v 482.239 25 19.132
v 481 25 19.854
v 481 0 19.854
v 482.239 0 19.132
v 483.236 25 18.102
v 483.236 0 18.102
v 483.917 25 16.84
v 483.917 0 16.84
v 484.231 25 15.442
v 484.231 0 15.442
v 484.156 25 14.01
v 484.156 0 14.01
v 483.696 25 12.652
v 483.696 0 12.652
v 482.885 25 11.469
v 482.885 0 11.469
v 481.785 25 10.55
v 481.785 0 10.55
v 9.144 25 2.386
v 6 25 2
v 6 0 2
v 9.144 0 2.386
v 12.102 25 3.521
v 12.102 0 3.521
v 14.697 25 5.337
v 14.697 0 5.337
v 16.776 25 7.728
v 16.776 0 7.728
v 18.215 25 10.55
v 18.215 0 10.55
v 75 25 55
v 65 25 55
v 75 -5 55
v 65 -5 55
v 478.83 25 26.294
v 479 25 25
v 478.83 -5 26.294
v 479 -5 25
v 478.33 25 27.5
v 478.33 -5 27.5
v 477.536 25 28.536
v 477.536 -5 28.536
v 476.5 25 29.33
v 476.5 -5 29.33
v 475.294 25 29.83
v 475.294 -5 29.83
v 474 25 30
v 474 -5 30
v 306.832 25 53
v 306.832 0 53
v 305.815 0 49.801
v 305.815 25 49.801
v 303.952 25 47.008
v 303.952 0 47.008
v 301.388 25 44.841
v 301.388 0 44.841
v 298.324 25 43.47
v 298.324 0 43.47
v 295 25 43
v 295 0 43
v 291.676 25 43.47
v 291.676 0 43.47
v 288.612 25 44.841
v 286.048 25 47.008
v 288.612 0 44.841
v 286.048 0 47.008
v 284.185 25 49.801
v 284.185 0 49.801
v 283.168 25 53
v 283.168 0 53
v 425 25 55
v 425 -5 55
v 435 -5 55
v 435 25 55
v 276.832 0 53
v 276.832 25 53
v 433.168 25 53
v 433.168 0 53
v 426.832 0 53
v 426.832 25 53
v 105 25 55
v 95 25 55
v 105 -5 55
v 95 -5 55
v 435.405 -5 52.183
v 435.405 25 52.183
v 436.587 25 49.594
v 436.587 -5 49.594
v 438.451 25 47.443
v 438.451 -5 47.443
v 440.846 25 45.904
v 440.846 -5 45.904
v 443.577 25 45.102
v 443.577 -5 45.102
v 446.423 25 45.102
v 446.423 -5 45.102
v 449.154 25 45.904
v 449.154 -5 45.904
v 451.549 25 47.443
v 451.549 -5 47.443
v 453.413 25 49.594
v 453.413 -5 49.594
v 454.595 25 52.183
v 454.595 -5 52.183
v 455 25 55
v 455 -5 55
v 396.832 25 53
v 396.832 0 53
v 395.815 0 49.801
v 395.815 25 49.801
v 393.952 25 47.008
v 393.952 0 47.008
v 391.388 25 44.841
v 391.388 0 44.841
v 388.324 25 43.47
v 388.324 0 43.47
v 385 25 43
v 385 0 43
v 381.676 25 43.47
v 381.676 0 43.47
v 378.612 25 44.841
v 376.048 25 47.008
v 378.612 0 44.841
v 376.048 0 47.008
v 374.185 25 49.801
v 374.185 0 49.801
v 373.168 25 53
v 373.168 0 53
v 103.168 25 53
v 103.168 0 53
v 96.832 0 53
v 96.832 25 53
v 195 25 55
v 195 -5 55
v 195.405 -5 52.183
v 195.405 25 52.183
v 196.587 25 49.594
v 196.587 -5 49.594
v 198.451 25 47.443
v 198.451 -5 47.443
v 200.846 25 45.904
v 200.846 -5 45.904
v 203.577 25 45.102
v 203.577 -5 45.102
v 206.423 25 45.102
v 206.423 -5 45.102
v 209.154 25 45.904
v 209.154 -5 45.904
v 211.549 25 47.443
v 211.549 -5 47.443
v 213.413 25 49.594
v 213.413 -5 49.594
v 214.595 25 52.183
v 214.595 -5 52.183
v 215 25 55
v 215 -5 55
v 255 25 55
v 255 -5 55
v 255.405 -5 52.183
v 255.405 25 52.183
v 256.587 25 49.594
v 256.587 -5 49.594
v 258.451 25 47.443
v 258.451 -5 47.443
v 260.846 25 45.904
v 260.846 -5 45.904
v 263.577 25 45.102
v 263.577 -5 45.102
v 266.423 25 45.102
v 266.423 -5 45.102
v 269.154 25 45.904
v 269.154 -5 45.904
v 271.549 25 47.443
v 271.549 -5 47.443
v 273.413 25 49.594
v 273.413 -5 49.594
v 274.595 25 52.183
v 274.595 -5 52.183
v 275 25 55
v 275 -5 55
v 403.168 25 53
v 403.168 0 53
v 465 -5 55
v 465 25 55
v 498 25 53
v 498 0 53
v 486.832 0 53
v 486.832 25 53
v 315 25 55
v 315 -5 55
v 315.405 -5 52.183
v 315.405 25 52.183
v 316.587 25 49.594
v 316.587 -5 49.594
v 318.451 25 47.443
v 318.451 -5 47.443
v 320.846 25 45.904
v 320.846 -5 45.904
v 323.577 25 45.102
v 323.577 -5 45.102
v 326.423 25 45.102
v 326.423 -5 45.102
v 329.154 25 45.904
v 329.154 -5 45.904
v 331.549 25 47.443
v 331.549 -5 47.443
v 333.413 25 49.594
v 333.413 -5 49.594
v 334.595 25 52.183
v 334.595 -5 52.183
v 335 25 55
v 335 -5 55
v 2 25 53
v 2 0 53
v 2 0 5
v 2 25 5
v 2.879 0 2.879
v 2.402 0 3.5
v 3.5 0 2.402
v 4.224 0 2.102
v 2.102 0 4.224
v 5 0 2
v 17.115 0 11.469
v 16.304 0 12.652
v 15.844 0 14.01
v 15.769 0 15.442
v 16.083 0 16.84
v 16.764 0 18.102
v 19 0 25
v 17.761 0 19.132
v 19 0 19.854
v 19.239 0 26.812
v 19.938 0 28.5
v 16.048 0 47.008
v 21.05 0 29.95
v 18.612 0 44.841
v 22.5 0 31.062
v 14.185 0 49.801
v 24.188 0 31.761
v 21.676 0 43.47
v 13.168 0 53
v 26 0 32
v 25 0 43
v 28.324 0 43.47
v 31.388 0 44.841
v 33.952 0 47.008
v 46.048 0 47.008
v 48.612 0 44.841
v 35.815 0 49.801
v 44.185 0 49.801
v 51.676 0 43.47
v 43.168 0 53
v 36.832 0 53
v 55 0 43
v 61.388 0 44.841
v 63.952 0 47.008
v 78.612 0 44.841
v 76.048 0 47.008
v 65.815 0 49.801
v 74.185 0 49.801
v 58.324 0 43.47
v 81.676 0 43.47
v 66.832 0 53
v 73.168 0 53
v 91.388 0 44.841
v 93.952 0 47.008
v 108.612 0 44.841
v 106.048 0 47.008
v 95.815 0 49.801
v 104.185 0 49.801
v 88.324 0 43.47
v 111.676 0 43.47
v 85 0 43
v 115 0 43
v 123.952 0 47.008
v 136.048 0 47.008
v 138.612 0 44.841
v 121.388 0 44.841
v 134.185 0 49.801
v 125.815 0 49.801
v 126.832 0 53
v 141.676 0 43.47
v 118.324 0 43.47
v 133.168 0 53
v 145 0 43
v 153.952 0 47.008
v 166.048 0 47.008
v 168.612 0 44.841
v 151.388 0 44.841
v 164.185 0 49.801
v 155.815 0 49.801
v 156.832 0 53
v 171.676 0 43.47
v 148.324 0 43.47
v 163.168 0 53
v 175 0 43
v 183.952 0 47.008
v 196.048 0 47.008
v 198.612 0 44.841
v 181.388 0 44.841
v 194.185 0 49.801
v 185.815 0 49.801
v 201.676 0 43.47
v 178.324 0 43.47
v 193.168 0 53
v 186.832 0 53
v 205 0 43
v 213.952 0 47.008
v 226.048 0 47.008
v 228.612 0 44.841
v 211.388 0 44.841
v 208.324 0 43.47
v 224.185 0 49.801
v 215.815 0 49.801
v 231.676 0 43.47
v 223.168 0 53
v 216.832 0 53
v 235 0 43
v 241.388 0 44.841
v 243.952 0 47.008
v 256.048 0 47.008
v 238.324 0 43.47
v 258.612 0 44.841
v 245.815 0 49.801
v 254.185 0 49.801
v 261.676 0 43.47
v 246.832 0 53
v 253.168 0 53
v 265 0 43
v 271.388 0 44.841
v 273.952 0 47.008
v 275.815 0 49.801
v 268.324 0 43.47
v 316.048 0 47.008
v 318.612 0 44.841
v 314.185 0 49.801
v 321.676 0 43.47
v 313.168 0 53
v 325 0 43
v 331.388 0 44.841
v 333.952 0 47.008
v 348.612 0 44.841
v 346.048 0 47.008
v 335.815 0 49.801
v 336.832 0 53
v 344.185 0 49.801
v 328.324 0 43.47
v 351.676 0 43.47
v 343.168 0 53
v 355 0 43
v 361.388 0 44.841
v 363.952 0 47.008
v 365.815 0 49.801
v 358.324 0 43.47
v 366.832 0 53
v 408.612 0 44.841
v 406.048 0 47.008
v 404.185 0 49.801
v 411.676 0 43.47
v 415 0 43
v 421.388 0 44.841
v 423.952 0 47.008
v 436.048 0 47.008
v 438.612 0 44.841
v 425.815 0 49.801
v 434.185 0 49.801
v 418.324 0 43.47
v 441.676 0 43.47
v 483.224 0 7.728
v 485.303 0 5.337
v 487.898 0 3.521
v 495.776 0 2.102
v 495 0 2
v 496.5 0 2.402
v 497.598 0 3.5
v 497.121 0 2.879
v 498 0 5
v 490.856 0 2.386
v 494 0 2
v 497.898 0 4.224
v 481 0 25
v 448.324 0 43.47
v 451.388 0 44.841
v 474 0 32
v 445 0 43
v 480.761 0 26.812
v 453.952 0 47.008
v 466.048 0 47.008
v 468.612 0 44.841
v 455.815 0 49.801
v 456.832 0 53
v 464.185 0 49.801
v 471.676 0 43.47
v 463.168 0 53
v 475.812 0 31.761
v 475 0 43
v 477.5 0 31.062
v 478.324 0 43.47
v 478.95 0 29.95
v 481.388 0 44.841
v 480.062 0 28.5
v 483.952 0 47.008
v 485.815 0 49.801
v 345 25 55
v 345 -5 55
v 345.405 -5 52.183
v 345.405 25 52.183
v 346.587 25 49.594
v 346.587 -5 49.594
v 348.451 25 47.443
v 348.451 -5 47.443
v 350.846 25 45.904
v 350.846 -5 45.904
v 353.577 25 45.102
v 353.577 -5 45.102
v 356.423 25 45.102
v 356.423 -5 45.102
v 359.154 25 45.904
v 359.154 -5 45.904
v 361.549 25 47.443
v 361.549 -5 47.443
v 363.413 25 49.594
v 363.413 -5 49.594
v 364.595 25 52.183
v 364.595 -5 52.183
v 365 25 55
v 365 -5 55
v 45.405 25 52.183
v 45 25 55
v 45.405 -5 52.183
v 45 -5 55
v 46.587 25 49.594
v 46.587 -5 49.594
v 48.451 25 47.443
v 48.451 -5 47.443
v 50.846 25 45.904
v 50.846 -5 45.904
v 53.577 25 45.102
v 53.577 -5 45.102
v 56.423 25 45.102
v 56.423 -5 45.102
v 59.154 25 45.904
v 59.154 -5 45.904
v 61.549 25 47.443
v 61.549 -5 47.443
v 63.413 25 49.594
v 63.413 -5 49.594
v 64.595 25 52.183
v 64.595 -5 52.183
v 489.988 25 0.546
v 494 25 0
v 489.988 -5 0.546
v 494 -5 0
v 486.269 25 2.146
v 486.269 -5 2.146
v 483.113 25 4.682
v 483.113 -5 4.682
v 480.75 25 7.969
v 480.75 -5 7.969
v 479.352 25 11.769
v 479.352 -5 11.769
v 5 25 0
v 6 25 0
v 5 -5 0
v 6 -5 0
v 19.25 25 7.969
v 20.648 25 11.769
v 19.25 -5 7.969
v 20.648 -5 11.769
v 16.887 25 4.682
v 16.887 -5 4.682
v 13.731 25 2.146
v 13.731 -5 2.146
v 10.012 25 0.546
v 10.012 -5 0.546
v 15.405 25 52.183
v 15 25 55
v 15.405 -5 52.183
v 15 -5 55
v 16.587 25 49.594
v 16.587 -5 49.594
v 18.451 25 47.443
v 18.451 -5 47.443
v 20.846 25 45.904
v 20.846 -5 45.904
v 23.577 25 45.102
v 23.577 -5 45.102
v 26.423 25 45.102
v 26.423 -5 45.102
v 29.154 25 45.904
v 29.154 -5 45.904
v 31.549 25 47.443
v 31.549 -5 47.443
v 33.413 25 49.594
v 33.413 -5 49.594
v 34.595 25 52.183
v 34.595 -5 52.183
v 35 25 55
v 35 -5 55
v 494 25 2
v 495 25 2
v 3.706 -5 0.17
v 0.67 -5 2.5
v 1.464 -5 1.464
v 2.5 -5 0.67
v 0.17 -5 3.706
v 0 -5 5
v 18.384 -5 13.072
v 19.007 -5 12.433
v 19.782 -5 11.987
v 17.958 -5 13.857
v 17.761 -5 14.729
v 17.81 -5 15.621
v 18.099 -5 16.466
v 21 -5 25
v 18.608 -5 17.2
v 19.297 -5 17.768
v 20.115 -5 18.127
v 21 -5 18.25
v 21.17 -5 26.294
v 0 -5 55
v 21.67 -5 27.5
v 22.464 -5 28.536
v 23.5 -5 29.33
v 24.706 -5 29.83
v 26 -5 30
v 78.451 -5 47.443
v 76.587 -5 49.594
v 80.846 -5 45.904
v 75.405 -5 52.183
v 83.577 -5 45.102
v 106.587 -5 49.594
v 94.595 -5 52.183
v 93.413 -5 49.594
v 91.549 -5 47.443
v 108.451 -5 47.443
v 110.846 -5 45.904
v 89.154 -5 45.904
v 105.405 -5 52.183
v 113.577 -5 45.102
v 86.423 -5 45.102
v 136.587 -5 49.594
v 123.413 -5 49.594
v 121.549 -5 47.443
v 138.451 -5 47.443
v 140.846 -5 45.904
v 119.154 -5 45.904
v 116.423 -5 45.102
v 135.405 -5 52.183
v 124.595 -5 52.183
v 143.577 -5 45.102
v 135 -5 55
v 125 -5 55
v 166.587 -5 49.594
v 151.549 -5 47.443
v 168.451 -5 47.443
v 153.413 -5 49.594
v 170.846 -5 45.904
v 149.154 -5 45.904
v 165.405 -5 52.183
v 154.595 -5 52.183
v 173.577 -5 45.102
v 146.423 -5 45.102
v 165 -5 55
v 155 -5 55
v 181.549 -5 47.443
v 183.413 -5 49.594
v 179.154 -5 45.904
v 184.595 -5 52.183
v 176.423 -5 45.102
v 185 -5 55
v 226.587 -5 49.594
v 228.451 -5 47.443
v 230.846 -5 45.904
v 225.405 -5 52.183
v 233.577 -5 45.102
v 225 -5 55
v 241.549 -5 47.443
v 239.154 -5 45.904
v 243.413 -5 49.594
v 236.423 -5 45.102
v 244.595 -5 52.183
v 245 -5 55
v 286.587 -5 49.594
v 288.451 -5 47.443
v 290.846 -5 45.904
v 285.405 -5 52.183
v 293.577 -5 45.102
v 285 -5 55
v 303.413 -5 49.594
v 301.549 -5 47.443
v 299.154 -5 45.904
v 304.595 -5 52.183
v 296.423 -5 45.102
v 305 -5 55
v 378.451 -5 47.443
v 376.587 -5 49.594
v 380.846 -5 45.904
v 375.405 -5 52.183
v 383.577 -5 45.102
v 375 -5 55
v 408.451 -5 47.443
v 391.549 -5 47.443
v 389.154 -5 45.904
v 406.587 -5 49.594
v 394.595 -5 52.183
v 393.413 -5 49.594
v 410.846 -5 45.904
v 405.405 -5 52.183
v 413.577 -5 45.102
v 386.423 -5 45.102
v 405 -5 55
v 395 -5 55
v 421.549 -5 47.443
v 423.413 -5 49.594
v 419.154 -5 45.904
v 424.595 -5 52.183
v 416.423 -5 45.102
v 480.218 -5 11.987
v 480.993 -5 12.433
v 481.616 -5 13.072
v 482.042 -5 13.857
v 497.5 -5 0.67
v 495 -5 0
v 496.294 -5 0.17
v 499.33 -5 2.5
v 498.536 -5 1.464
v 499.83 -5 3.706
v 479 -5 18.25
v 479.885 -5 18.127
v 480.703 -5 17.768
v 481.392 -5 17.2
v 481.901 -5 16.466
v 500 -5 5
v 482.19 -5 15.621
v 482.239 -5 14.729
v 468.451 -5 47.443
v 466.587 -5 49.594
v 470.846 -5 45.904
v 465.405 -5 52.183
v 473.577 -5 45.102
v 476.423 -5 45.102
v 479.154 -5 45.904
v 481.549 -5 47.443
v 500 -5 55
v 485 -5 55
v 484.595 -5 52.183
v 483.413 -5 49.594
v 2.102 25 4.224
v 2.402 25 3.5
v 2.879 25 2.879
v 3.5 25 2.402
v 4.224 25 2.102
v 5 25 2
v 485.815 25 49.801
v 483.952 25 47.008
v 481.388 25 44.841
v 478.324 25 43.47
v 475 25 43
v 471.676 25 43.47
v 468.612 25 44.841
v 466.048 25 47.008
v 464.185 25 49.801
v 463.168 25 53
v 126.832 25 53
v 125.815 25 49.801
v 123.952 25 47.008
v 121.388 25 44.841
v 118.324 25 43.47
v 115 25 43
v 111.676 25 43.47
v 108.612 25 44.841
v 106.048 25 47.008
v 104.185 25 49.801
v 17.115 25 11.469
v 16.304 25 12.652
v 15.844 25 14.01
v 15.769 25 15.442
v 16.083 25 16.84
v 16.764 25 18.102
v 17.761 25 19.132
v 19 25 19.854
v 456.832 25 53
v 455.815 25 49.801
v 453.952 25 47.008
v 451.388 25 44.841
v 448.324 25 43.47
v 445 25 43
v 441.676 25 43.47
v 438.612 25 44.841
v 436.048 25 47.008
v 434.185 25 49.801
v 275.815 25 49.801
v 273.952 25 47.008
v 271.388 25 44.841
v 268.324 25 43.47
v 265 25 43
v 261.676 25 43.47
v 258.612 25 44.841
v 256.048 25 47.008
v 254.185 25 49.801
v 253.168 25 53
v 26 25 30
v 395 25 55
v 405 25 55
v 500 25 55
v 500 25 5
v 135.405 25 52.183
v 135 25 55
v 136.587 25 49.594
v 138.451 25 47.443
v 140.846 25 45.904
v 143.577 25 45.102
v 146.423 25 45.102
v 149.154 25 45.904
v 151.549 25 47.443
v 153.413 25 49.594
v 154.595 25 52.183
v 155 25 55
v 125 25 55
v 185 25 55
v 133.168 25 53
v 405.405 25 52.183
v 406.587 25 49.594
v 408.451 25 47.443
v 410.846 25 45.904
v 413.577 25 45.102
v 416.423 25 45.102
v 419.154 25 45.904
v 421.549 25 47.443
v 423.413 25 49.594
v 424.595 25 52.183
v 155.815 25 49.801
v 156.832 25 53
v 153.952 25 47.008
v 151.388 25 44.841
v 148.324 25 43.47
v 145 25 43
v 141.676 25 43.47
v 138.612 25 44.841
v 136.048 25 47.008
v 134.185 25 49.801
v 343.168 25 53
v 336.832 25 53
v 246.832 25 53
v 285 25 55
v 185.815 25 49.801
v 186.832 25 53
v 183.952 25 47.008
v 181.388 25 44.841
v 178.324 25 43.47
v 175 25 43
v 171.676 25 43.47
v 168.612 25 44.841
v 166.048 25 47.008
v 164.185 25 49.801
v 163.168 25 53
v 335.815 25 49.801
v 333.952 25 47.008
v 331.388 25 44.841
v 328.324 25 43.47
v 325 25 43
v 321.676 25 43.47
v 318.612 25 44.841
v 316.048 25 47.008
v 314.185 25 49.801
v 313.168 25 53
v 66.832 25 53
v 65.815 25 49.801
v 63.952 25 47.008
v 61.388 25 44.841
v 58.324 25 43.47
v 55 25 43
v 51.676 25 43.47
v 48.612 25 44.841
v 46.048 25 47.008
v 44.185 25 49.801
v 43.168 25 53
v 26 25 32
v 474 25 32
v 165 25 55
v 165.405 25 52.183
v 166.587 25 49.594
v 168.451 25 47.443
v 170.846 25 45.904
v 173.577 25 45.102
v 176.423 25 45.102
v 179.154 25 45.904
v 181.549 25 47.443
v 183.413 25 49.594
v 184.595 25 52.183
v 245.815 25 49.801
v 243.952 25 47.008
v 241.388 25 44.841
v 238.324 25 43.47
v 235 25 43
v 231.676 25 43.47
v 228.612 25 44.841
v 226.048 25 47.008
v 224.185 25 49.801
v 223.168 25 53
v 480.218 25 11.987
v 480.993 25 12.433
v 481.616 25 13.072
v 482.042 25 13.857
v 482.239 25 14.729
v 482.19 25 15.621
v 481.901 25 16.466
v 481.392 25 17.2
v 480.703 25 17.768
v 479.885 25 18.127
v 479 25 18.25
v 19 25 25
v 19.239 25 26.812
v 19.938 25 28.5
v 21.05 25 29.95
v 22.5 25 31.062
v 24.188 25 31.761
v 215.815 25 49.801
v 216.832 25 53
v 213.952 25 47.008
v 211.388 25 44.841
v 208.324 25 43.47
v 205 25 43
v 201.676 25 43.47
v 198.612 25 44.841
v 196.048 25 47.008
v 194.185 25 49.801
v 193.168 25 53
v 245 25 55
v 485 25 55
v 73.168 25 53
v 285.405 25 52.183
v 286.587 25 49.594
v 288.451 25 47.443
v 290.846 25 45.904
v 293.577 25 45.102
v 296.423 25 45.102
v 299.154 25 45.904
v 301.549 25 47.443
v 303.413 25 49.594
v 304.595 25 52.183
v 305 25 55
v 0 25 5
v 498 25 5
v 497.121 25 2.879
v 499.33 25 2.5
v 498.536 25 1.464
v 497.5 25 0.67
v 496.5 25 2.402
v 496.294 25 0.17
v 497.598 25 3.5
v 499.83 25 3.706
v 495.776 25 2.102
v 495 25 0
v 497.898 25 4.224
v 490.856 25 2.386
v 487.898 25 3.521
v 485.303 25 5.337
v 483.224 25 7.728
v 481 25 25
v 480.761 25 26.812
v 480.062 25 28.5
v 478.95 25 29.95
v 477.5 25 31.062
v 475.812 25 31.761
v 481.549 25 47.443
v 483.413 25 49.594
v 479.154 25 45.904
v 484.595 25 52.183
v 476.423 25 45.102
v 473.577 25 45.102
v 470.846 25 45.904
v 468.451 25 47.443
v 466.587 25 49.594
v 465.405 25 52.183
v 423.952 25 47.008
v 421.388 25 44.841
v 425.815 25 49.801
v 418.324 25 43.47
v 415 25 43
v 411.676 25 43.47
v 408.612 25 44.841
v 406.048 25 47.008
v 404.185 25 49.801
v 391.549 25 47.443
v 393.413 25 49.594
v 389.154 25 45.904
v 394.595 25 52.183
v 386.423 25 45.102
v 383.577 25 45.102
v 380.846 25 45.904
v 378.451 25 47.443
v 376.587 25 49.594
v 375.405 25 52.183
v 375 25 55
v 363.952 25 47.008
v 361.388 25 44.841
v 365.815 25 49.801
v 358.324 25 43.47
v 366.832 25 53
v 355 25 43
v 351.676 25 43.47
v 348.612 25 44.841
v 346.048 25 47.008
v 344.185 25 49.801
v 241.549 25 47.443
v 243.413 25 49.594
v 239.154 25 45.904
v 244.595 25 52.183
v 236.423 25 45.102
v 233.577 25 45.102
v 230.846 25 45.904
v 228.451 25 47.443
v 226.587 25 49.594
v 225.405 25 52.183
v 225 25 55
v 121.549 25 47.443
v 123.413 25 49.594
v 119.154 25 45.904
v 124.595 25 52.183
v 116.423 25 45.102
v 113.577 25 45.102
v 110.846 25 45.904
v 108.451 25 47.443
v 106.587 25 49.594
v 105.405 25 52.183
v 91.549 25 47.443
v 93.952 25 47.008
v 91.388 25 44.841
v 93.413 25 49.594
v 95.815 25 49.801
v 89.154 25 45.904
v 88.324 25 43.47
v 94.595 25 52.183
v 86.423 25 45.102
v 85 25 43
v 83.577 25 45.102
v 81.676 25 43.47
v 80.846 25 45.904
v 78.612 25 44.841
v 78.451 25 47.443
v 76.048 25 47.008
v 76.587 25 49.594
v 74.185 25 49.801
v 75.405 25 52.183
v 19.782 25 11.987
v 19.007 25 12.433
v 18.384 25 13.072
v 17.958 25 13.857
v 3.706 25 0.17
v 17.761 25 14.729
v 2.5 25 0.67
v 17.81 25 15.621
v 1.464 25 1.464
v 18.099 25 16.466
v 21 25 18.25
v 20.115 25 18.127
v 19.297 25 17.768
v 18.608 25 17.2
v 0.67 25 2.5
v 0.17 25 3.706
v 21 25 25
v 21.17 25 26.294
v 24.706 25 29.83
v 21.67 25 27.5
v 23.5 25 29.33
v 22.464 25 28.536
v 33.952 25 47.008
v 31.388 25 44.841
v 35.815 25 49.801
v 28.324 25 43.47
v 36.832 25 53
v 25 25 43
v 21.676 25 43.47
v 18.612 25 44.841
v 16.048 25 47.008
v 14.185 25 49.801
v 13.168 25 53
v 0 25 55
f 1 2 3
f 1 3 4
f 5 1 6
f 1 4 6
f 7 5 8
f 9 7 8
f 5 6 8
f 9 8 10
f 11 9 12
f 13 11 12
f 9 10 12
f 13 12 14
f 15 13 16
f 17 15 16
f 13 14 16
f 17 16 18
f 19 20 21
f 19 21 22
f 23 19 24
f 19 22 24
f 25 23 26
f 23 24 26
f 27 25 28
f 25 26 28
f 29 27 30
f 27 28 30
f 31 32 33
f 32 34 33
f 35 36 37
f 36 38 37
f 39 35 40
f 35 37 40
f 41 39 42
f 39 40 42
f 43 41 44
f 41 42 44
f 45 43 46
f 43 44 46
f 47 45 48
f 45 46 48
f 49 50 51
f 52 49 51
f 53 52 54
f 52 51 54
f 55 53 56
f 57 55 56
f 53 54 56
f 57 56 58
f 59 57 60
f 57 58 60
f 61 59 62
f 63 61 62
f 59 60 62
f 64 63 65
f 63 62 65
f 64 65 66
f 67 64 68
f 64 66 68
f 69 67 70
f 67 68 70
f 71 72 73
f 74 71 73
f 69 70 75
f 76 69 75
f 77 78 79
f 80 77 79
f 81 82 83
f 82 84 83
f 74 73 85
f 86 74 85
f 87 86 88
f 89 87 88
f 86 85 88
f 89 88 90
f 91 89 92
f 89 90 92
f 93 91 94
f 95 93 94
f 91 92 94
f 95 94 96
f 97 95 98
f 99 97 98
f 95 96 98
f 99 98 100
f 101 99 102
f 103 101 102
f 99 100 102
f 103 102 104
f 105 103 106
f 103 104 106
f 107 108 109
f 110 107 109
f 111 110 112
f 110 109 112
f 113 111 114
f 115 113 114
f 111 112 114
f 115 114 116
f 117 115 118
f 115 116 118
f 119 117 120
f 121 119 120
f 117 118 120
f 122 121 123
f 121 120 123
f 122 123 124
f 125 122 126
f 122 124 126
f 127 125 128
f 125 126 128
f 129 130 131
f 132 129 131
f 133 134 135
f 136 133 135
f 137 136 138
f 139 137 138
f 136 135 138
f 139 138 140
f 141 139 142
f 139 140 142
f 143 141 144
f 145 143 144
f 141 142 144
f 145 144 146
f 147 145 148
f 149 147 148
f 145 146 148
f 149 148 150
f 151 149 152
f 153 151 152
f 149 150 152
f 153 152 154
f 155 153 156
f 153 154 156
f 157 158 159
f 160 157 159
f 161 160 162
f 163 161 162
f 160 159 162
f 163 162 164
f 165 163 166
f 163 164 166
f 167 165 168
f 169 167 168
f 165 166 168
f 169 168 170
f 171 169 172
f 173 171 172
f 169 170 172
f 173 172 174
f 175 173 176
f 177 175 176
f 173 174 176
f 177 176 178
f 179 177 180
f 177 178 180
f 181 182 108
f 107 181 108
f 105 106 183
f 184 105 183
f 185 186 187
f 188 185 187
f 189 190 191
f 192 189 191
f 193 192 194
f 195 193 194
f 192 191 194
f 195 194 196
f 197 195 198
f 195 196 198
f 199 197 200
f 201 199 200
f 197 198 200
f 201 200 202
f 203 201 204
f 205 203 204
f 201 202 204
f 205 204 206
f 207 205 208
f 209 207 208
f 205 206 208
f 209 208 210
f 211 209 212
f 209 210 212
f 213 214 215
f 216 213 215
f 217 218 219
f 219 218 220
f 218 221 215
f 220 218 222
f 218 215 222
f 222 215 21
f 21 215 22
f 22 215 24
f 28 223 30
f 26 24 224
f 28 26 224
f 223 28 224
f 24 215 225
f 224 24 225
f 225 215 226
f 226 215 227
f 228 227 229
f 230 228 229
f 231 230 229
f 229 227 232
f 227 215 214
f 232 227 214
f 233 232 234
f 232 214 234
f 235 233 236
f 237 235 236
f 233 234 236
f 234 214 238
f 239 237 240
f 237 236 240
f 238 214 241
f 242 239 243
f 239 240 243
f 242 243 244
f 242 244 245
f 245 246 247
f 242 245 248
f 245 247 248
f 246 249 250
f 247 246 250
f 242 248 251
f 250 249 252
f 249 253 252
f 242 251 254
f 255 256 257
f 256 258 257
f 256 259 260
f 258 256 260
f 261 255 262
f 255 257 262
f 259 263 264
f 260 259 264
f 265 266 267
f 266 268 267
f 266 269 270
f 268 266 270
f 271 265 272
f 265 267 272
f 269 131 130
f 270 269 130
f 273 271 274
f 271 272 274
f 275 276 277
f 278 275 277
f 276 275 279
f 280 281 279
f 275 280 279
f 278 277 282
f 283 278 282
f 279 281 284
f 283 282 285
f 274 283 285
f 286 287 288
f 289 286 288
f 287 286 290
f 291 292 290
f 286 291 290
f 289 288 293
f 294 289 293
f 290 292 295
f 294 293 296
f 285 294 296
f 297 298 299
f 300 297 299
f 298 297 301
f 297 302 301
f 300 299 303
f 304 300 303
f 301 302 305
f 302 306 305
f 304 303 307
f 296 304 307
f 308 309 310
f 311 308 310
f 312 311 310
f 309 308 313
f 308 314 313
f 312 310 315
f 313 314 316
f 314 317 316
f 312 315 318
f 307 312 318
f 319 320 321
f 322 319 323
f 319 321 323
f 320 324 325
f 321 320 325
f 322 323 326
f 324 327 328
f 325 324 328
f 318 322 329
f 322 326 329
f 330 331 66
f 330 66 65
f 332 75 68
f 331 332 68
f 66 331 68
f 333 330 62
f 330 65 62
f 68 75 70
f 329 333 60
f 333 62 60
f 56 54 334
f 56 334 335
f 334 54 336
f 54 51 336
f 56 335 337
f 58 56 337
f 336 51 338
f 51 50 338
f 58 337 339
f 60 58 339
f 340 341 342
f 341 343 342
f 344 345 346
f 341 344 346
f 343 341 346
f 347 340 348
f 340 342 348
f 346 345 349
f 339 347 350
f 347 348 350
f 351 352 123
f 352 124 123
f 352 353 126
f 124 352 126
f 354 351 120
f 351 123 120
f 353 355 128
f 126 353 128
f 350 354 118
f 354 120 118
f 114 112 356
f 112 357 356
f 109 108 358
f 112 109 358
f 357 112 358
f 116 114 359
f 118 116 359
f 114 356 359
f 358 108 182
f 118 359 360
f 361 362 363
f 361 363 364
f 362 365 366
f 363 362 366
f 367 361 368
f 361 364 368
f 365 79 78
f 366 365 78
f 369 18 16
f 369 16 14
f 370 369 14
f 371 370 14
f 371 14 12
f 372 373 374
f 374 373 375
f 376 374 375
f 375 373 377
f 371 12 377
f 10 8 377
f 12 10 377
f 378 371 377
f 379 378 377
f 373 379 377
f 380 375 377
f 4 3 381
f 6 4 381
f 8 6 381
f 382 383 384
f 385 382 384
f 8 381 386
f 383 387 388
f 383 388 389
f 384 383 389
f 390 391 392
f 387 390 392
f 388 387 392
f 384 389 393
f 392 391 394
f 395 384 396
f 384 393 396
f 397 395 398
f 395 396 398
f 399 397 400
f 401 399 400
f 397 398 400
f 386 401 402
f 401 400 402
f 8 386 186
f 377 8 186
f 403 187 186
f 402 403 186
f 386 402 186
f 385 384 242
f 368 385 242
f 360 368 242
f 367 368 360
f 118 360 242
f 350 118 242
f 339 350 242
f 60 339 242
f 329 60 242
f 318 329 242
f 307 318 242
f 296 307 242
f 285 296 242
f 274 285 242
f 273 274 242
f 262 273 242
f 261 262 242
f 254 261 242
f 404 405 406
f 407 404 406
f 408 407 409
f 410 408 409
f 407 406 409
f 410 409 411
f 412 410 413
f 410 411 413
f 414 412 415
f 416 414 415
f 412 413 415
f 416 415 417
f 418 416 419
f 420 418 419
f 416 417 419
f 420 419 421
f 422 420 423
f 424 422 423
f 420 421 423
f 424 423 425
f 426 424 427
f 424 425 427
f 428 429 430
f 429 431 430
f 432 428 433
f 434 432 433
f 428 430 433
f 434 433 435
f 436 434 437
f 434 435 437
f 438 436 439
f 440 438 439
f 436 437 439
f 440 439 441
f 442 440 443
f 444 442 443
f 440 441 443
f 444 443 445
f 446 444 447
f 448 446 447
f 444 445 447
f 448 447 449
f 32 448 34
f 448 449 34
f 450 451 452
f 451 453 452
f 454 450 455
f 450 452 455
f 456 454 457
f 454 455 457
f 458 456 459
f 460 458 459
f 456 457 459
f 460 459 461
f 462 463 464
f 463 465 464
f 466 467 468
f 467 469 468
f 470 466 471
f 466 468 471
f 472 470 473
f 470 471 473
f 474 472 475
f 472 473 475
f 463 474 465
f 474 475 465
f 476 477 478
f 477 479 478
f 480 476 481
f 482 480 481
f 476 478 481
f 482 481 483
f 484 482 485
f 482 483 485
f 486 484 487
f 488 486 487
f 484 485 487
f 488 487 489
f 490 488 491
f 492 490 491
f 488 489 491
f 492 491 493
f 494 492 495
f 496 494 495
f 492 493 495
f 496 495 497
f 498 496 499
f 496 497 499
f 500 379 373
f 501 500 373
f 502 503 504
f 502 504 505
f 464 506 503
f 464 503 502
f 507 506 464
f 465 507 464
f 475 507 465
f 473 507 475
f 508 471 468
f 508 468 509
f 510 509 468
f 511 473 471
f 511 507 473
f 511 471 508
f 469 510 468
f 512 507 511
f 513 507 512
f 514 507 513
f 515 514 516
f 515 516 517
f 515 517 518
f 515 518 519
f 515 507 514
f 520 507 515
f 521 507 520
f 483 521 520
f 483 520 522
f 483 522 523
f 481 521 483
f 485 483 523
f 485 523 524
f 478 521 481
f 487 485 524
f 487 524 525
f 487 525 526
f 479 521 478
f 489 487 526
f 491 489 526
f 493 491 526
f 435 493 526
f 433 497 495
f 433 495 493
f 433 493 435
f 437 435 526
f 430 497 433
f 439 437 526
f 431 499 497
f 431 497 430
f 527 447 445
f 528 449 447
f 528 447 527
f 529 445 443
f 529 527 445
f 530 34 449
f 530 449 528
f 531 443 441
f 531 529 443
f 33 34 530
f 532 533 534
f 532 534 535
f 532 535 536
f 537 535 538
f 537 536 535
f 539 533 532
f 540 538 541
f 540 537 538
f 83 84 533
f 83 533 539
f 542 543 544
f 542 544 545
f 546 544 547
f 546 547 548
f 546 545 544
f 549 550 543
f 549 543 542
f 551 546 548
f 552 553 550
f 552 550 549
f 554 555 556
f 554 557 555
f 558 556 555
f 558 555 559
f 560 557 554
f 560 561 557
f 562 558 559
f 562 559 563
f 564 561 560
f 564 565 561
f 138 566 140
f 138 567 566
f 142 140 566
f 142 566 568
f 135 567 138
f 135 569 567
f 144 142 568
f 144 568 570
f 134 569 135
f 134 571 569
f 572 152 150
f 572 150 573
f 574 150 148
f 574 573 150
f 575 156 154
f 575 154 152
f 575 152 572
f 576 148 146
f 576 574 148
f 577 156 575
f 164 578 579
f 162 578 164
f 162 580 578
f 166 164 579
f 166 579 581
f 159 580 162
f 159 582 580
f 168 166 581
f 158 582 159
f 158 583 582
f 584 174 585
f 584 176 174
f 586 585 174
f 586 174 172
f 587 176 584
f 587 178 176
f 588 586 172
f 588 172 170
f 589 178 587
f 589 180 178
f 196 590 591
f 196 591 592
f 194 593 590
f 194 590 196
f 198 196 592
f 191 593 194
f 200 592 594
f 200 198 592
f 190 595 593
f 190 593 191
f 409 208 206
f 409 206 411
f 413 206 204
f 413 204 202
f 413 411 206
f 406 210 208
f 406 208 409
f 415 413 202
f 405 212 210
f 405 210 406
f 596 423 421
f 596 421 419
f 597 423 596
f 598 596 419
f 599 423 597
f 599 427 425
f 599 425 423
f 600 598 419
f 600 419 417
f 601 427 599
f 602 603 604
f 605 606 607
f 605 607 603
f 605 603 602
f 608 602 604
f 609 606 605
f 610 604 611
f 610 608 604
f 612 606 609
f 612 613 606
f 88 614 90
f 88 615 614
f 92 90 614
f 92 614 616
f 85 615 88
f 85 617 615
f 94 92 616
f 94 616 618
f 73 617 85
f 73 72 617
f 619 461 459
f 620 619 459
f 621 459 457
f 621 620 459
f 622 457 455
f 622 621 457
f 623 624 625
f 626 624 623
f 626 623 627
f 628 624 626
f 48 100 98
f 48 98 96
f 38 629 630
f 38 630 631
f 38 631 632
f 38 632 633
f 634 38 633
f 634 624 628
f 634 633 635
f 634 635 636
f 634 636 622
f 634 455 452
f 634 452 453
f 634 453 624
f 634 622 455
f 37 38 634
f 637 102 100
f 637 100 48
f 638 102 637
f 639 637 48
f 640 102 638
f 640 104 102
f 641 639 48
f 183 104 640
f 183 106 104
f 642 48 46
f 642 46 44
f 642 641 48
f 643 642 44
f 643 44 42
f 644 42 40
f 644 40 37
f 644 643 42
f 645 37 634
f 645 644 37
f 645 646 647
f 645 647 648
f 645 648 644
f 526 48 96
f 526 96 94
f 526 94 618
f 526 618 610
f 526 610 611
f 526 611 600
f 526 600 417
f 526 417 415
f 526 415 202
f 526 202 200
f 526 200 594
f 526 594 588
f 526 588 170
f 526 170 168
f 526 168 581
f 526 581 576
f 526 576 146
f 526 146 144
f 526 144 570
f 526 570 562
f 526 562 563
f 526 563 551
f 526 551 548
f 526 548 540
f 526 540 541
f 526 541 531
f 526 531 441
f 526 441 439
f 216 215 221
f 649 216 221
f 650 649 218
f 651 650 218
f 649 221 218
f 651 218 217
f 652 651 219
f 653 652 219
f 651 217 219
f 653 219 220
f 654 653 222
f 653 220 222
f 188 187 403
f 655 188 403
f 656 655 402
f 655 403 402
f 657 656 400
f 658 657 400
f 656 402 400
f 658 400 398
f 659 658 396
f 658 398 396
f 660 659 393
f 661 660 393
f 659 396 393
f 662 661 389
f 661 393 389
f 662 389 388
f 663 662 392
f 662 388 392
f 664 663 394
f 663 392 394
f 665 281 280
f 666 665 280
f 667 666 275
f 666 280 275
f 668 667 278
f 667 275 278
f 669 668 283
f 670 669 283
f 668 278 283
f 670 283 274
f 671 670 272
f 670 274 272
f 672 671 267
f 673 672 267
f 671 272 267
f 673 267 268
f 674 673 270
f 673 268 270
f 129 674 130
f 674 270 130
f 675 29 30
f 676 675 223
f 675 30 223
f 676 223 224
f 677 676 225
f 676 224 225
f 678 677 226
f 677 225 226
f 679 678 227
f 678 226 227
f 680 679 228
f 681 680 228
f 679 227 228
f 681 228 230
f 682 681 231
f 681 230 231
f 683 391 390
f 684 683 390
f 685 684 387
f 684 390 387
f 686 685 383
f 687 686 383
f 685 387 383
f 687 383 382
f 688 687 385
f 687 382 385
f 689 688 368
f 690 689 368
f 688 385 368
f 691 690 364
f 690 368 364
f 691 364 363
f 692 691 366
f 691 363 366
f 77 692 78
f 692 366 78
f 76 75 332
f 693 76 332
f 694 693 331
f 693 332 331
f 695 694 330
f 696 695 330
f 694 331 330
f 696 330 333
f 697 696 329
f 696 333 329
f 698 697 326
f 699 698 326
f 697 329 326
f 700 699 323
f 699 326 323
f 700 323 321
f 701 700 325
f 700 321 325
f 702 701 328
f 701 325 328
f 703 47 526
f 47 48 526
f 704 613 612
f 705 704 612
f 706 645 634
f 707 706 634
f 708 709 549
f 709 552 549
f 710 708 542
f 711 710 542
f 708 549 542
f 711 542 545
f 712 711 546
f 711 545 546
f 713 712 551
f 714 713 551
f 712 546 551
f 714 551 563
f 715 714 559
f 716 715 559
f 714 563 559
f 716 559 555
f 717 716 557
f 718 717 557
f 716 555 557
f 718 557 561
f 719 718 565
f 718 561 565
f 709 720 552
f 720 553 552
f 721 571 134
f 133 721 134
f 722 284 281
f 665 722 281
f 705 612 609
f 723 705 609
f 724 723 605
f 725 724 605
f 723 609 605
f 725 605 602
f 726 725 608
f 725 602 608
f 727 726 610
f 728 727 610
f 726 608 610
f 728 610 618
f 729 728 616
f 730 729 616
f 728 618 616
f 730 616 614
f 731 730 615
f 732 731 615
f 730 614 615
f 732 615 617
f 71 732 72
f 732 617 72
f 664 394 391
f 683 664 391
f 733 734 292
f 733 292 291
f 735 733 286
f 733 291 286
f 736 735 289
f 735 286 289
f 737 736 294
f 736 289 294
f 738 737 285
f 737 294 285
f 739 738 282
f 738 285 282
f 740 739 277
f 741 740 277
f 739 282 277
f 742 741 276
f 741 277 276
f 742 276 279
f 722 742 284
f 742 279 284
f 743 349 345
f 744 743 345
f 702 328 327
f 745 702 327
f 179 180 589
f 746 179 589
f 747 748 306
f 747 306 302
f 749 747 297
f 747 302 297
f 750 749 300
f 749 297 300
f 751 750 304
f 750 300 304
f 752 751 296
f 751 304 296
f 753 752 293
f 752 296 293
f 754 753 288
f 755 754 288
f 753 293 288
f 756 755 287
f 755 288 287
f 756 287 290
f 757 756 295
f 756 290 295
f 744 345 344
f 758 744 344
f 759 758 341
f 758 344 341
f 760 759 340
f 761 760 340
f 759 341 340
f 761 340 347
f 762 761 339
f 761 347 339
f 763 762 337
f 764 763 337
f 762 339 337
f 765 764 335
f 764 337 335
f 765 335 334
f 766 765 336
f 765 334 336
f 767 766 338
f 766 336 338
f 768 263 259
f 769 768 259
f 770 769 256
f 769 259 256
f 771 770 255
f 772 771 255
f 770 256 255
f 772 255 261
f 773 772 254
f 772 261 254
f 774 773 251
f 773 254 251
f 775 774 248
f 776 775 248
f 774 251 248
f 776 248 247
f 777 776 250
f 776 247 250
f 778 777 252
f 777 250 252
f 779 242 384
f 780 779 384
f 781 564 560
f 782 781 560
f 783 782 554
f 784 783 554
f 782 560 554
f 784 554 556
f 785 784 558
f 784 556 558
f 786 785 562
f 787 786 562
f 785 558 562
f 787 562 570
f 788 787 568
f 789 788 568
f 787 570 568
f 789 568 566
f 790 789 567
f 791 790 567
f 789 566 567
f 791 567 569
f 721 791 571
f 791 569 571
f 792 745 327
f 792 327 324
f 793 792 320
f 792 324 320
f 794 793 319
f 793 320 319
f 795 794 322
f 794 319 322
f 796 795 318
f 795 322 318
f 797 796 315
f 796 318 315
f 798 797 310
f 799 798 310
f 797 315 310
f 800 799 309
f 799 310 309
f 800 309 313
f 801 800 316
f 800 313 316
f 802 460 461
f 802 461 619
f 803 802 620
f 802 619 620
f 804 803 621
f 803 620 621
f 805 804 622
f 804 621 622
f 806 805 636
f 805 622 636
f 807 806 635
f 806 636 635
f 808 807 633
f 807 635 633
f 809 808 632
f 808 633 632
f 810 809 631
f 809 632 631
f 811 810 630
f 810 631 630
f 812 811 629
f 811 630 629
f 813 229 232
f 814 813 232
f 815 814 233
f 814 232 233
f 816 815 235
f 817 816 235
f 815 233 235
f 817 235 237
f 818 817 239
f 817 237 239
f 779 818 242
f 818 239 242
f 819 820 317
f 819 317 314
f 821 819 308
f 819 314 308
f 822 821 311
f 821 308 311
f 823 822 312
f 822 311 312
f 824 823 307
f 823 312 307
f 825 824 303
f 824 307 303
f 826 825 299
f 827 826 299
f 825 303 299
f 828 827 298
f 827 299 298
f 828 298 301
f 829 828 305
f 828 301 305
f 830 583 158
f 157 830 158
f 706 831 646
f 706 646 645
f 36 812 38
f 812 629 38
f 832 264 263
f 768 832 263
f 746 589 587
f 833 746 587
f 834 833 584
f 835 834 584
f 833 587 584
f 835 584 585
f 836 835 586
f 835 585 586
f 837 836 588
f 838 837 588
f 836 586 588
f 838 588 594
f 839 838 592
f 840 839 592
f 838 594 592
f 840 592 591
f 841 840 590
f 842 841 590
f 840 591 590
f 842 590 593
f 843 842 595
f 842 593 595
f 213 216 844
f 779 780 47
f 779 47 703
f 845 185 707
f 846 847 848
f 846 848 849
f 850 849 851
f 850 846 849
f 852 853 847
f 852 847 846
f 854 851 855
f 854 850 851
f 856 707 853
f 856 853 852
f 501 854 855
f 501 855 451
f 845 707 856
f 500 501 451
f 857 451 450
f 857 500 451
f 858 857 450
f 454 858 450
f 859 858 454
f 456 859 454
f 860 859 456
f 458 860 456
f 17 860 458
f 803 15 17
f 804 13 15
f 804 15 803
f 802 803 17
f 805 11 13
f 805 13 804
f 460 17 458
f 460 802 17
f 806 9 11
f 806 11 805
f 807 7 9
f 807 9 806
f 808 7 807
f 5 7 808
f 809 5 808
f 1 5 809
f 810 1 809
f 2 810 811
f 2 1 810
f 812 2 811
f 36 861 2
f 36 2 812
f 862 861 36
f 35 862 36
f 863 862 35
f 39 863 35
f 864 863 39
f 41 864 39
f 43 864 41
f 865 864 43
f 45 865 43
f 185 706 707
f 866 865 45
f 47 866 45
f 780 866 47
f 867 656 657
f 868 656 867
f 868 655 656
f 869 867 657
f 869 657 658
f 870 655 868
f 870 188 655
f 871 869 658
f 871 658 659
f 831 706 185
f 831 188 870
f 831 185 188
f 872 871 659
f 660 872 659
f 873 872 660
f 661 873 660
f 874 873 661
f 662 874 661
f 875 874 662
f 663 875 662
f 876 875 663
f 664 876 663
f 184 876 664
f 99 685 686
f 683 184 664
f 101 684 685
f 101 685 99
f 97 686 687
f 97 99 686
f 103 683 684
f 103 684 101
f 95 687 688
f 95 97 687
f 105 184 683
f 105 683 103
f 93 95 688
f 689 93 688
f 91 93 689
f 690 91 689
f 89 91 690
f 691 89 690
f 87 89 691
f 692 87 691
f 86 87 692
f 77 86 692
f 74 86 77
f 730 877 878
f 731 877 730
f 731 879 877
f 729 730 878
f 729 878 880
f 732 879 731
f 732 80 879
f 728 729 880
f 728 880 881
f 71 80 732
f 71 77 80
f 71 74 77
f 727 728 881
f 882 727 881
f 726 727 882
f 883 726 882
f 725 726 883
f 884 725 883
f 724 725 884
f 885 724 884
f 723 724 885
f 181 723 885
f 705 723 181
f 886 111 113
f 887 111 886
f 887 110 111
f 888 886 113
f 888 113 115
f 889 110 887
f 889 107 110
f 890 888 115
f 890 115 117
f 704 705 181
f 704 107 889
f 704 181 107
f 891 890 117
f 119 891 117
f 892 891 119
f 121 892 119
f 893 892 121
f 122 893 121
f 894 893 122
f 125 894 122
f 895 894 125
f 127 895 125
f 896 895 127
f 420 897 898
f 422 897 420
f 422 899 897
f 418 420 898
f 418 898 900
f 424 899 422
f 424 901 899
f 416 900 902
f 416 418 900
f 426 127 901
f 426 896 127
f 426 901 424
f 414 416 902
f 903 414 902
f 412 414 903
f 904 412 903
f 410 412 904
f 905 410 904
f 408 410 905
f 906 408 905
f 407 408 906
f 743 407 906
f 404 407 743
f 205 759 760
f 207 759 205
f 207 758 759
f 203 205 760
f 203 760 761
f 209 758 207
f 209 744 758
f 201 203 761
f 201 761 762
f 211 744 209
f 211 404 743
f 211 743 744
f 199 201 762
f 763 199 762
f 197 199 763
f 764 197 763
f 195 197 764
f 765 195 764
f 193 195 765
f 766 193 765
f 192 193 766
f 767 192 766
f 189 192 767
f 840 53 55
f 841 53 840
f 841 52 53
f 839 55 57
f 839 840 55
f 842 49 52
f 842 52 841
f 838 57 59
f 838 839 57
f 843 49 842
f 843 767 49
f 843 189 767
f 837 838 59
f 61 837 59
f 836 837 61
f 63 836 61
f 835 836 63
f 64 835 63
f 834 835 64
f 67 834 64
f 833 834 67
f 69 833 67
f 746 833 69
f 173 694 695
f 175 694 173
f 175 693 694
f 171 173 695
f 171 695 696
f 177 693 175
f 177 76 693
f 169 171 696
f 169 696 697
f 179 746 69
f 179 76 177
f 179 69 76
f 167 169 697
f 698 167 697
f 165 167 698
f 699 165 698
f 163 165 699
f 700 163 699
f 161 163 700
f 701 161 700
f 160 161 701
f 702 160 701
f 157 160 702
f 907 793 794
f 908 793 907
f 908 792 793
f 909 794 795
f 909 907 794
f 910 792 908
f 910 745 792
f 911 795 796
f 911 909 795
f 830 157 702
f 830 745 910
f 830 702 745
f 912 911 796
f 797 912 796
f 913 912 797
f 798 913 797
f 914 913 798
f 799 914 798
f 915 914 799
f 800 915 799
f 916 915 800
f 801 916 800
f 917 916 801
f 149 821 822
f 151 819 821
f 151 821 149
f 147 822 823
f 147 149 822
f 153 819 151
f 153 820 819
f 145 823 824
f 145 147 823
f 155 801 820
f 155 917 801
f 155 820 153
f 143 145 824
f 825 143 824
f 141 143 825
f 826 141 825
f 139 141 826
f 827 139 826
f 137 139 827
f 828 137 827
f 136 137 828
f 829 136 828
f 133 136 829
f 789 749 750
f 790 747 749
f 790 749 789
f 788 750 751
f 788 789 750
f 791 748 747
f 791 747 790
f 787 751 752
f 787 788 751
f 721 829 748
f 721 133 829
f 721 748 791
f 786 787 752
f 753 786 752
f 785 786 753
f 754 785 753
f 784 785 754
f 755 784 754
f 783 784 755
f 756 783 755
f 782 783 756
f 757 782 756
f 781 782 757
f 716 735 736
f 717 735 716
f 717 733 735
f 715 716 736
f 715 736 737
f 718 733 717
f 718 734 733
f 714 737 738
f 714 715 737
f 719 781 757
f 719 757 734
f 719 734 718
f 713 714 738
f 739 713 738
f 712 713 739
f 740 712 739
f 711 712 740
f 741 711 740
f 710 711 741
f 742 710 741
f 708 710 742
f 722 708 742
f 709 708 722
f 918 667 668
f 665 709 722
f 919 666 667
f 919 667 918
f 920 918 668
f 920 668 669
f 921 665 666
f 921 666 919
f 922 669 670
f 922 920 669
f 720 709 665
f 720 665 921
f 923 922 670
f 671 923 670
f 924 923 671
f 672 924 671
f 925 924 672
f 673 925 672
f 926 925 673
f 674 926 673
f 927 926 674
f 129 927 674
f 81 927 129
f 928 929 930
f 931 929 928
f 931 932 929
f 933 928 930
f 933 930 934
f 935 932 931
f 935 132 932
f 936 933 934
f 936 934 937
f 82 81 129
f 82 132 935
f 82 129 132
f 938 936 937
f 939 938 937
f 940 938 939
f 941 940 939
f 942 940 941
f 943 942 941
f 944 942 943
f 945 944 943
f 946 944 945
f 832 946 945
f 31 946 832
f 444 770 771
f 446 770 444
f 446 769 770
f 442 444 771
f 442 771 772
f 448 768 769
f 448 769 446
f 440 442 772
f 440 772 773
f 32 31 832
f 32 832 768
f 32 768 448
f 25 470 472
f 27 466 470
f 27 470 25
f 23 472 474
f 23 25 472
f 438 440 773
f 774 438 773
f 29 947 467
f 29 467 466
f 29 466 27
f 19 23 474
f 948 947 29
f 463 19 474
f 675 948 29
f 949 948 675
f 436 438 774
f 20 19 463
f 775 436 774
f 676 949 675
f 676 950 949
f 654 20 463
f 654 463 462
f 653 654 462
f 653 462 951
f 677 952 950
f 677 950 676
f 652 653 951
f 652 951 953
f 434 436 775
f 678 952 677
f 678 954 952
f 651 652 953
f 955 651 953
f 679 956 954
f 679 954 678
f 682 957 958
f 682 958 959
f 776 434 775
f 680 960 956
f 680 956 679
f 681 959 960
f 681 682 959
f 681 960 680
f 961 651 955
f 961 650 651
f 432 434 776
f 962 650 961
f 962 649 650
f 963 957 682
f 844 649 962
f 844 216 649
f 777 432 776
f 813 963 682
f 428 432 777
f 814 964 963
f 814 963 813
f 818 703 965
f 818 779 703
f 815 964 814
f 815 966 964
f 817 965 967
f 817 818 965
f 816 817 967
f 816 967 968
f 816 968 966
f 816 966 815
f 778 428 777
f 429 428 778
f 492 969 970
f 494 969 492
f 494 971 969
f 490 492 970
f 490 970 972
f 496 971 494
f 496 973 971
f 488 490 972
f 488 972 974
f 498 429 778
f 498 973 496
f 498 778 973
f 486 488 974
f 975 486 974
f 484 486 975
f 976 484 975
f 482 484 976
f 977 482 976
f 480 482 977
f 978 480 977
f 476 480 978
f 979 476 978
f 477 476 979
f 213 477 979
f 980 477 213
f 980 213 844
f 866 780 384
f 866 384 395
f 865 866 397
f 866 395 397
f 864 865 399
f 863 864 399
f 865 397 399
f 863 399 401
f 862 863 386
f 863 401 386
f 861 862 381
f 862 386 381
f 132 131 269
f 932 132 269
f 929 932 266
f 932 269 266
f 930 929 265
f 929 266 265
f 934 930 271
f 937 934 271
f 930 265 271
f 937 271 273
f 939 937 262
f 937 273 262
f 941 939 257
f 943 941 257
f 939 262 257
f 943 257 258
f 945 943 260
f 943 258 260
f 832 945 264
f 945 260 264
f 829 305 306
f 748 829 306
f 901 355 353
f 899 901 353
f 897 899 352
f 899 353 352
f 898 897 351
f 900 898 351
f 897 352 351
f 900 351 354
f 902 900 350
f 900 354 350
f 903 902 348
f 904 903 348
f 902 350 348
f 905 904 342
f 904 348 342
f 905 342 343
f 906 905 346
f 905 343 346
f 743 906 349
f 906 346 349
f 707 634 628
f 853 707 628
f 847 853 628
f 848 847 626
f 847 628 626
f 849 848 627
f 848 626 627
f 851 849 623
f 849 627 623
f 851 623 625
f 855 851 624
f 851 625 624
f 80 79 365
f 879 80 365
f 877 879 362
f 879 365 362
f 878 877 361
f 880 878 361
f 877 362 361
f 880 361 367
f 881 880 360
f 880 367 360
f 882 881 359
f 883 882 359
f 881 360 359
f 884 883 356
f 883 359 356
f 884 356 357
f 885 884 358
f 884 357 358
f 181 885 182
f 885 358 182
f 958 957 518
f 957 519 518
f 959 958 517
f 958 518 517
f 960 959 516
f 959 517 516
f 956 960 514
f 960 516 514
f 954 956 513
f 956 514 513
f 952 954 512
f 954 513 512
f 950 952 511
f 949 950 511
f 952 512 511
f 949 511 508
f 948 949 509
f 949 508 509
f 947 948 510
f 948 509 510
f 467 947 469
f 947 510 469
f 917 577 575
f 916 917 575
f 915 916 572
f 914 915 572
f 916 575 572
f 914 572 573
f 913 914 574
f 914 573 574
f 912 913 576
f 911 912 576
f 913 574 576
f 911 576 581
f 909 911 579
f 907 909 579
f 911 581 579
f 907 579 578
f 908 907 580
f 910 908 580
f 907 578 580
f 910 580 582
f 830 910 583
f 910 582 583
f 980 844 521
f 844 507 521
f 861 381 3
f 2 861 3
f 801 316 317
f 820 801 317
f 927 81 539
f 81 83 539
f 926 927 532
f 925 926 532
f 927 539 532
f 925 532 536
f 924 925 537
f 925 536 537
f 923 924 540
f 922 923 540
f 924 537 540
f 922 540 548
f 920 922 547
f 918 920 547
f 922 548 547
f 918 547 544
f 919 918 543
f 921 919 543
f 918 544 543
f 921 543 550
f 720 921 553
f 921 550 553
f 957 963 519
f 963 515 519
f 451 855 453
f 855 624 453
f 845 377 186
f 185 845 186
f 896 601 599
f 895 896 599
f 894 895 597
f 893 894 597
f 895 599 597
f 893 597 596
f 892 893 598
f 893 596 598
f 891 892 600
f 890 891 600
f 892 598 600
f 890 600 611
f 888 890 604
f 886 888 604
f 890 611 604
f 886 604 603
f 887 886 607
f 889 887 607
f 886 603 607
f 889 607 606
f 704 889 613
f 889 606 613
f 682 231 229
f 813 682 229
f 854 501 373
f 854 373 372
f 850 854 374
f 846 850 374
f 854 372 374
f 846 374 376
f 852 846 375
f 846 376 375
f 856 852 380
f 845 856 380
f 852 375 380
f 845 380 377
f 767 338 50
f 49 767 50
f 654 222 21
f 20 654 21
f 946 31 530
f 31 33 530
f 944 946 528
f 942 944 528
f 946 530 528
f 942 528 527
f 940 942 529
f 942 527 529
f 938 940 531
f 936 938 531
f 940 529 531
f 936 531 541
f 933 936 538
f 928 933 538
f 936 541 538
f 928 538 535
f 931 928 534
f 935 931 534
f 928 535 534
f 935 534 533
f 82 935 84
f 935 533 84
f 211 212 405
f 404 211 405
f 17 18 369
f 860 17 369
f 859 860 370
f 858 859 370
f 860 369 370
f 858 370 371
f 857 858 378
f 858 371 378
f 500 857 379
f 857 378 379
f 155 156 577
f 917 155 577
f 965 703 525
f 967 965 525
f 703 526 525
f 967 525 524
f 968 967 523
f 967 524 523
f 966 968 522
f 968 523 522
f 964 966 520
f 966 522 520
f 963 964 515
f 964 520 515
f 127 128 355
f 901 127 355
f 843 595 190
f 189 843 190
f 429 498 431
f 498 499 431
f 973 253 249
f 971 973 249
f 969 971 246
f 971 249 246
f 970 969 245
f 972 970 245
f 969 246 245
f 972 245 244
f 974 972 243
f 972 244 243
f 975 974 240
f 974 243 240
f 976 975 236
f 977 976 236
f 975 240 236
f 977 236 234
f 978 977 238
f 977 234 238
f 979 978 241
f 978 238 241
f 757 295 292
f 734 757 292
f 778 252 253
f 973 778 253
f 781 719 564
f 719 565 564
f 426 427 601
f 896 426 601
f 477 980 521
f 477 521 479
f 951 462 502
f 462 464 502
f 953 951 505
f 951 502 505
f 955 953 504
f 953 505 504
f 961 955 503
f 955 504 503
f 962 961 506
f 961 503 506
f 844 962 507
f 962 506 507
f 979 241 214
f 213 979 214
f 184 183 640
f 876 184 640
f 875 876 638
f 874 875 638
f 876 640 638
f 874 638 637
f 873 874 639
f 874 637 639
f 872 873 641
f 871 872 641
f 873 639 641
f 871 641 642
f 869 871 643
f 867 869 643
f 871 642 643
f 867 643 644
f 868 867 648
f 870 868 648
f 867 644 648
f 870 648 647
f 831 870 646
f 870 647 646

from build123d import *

# Parameters (mm, degrees)
F1_DEPTH = 5
F3_DEPTH = 25


with BuildPart() as f1:
    # F0 (on Front) → F1 (new body)
    with BuildSketch(Plane.XZ):
        with BuildLine():
            ThreePointArc((0, 5), (1.464466, 1.464466), (5, 0))
            Line((5, 0), (6, 0))
            ThreePointArc((6, 0), (15.395129, 3.306774), (20.647917, 11.769127))
            ThreePointArc((20.647917, 11.769127), (17.754785, 15.176301), (21, 18.25))
            Line((21, 18.25), (21, 25))
            ThreePointArc((21, 25), (22.464466, 28.535534), (26, 30))
            Line((26, 30), (474, 30))
            ThreePointArc((474, 30), (477.535534, 28.535534), (479, 25))
            Line((479, 25), (479, 18.25))
            ThreePointArc((479, 18.25), (482.245215, 15.176301), (479.352083, 11.769127))
            ThreePointArc((479.352083, 11.769127), (484.604871, 3.306774), (494, 0))
            Line((494, 0), (495, 0))
            ThreePointArc((495, 0), (498.535534, 1.464466), (500, 5))
            Line((500, 5), (500, 55))
            Line((500, 55), (485, 55))
            ThreePointArc((485, 55), (475, 45), (465, 55))
            Line((465, 55), (455, 55))
            ThreePointArc((455, 55), (445, 45), (435, 55))
            Line((435, 55), (425, 55))
            ThreePointArc((425, 55), (415, 45), (405, 55))
            Line((405, 55), (395, 55))
            ThreePointArc((395, 55), (385, 45), (375, 55))
            Line((375, 55), (365, 55))
            ThreePointArc((365, 55), (355, 45), (345, 55))
            Line((345, 55), (335, 55))
            ThreePointArc((335, 55), (325, 45), (315, 55))
            Line((315, 55), (305, 55))
            ThreePointArc((305, 55), (295, 45), (285, 55))
            Line((285, 55), (275, 55))
            ThreePointArc((275, 55), (265, 45), (255, 55))
            Line((255, 55), (245, 55))
            ThreePointArc((245, 55), (235, 45), (225, 55))
            Line((225, 55), (215, 55))
            ThreePointArc((215, 55), (205, 45), (195, 55))
            Line((195, 55), (185, 55))
            ThreePointArc((185, 55), (175, 45), (165, 55))
            Line((165, 55), (155, 55))
            ThreePointArc((155, 55), (145, 45), (135, 55))
            Line((135, 55), (125, 55))
            ThreePointArc((125, 55), (115, 45), (105, 55))
            Line((105, 55), (95, 55))
            ThreePointArc((95, 55), (85, 45), (75, 55))
            Line((75, 55), (65, 55))
            ThreePointArc((65, 55), (55, 45), (45, 55))
            Line((45, 55), (35, 55))
            ThreePointArc((35, 55), (25, 45), (15, 55))
            Line((15, 55), (0, 55))
            Line((0, 55), (0, 5))
        make_face()
    extrude(amount=F1_DEPTH)

    # F2 (on face) → F3 (join)
    with BuildSketch(Plane(origin=(0, 0, 0), x_dir=(-1, 0, 0), z_dir=(0, 1, 0))):
        with BuildLine():
            ThreePointArc((-500, 5), (-498.535534, 1.464466), (-495, 0))
            Line((-495, 0), (-494, 0))
            ThreePointArc((-494, 0), (-484.604871, 3.306774), (-479.352083, 11.769127))
            ThreePointArc((-479.352083, 11.769127), (-482.245215, 15.176301), (-479, 18.25))
            Line((-479, 18.25), (-479, 25))
            ThreePointArc((-479, 25), (-477.535534, 28.535534), (-474, 30))
            Line((-474, 30), (-26, 30))
            ThreePointArc((-26, 30), (-22.464466, 28.535534), (-21, 25))
            Line((-21, 25), (-21, 18.25))
            ThreePointArc((-21, 18.25), (-17.754785, 15.176301), (-20.647917, 11.769127))
            ThreePointArc((-20.647917, 11.769127), (-15.395129, 3.306774), (-6, 0))
            Line((-6, 0), (-5, 0))
            ThreePointArc((-5, 0), (-1.464466, 1.464466), (0, 5))
            Line((0, 5), (0, 55))
            Line((0, 55), (-15, 55))
            ThreePointArc((-15, 55), (-25, 45), (-35, 55))
            Line((-35, 55), (-45, 55))
            ThreePointArc((-45, 55), (-55, 45), (-65, 55))
            Line((-65, 55), (-75, 55))
            ThreePointArc((-75, 55), (-85, 45), (-95, 55))
            Line((-95, 55), (-105, 55))
            ThreePointArc((-105, 55), (-115, 45), (-125, 55))
            Line((-125, 55), (-135, 55))
            ThreePointArc((-135, 55), (-145, 45), (-155, 55))
            Line((-155, 55), (-165, 55))
            ThreePointArc((-165, 55), (-175, 45), (-185, 55))
            Line((-185, 55), (-195, 55))
            ThreePointArc((-195, 55), (-205, 45), (-215, 55))
            Line((-215, 55), (-225, 55))
            ThreePointArc((-225, 55), (-235, 45), (-245, 55))
            Line((-245, 55), (-255, 55))
            ThreePointArc((-255, 55), (-265, 45), (-275, 55))
            Line((-275, 55), (-285, 55))
            ThreePointArc((-285, 55), (-295, 45), (-305, 55))
            Line((-305, 55), (-315, 55))
            ThreePointArc((-315, 55), (-325, 45), (-335, 55))
            Line((-335, 55), (-345, 55))
            ThreePointArc((-345, 55), (-355, 45), (-365, 55))
            Line((-365, 55), (-375, 55))
            ThreePointArc((-375, 55), (-385, 45), (-395, 55))
            Line((-395, 55), (-405, 55))
            ThreePointArc((-405, 55), (-415, 45), (-425, 55))
            Line((-425, 55), (-435, 55))
            ThreePointArc((-435, 55), (-445, 45), (-455, 55))
            Line((-455, 55), (-465, 55))
            ThreePointArc((-465, 55), (-475, 45), (-485, 55))
            Line((-485, 55), (-500, 55))
            Line((-500, 55), (-500, 5))
        make_face()
        with BuildLine():
            Line((-343.16784, 52.999999), (-336.83216, 52.999999))
            ThreePointArc((-336.83216, 52.999999), (-325, 42.999999), (-313.16784, 52.999999))
            Line((-313.16784, 52.999999), (-306.83216, 52.999999))
            ThreePointArc((-306.83216, 52.999999), (-295, 42.999999), (-283.16784, 52.999999))
            Line((-283.16784, 52.999999), (-276.83216, 52.999999))
            ThreePointArc((-276.83216, 52.999999), (-265, 42.999999), (-253.16784, 52.999999))
            Line((-253.16784, 52.999999), (-246.83216, 52.999999))
            ThreePointArc((-246.83216, 52.999999), (-235, 42.999999), (-223.16784, 52.999999))
            Line((-223.16784, 52.999999), (-216.83216, 52.999999))
            ThreePointArc((-216.83216, 52.999999), (-205, 42.999999), (-193.16784, 52.999999))
            Line((-193.16784, 52.999999), (-186.83216, 52.999999))
            ThreePointArc((-186.83216, 52.999999), (-175, 42.999999), (-163.16784, 52.999999))
            Line((-163.16784, 52.999999), (-156.83216, 52.999999))
            ThreePointArc((-156.83216, 52.999999), (-145, 42.999999), (-133.16784, 52.999999))
            Line((-133.16784, 52.999999), (-126.83216, 52.999999))
            ThreePointArc((-126.83216, 52.999999), (-115, 42.999999), (-103.16784, 52.999999))
            Line((-103.16784, 52.999999), (-96.83216, 52.999999))
            ThreePointArc((-96.83216, 52.999999), (-85, 42.999999), (-73.16784, 52.999999))
            Line((-73.16784, 52.999999), (-66.83216, 52.999999))
            ThreePointArc((-66.83216, 52.999999), (-55, 42.999999), (-43.16784, 52.999999))
            Line((-43.16784, 52.999999), (-36.83216, 52.999999))
            ThreePointArc((-36.83216, 52.999999), (-25, 42.999999), (-13.16784, 52.999999))
            Line((-13.16784, 52.999999), (-2.000001, 52.999999))
            Line((-2.000001, 52.999999), (-2.000001, 5))
            ThreePointArc((-2.000001, 5), (-2.87868, 2.87868), (-5, 2.000001))
            Line((-5, 2.000001), (-6, 2.000001))
            ThreePointArc((-6, 2.000001), (-13.454792, 4.349833), (-18.214583, 10.549836))
            ThreePointArc((-18.214583, 10.549836), (-15.768605, 15.441606), (-18.999999, 19.854122))
            Line((-18.999999, 19.854122), (-18.999999, 25))
            ThreePointArc((-18.999999, 25), (-21.050252, 29.949748), (-26, 32.000001))
            Line((-26, 32.000001), (-474, 32.000001))
            ThreePointArc((-474, 32.000001), (-478.949748, 29.949748), (-481.000001, 25))
            Line((-481.000001, 25), (-481.000001, 19.854122))
            ThreePointArc((-481.000001, 19.854122), (-484.231395, 15.441606), (-481.785417, 10.549836))
            ThreePointArc((-481.785417, 10.549836), (-486.545208, 4.349833), (-494, 2.000001))
            Line((-494, 2.000001), (-495, 2.000001))
            ThreePointArc((-495, 2.000001), (-497.12132, 2.87868), (-497.999999, 5))
            Line((-497.999999, 5), (-497.999999, 52.999999))
            Line((-497.999999, 52.999999), (-486.83216, 52.999999))
            ThreePointArc((-486.83216, 52.999999), (-475, 42.999999), (-463.16784, 52.999999))
            Line((-463.16784, 52.999999), (-456.83216, 52.999999))
            ThreePointArc((-456.83216, 52.999999), (-445, 42.999999), (-433.16784, 52.999999))
            Line((-433.16784, 52.999999), (-426.83216, 52.999999))
            ThreePointArc((-426.83216, 52.999999), (-415, 42.999999), (-403.16784, 52.999999))
            Line((-403.16784, 52.999999), (-396.83216, 52.999999))
            ThreePointArc((-396.83216, 52.999999), (-385, 42.999999), (-373.16784, 52.999999))
            Line((-373.16784, 52.999999), (-366.83216, 52.999999))
            ThreePointArc((-366.83216, 52.999999), (-355, 42.999999), (-343.16784, 52.999999))
        make_face(mode=Mode.SUBTRACT)
    extrude(amount=F3_DEPTH)


solid = f1.part
